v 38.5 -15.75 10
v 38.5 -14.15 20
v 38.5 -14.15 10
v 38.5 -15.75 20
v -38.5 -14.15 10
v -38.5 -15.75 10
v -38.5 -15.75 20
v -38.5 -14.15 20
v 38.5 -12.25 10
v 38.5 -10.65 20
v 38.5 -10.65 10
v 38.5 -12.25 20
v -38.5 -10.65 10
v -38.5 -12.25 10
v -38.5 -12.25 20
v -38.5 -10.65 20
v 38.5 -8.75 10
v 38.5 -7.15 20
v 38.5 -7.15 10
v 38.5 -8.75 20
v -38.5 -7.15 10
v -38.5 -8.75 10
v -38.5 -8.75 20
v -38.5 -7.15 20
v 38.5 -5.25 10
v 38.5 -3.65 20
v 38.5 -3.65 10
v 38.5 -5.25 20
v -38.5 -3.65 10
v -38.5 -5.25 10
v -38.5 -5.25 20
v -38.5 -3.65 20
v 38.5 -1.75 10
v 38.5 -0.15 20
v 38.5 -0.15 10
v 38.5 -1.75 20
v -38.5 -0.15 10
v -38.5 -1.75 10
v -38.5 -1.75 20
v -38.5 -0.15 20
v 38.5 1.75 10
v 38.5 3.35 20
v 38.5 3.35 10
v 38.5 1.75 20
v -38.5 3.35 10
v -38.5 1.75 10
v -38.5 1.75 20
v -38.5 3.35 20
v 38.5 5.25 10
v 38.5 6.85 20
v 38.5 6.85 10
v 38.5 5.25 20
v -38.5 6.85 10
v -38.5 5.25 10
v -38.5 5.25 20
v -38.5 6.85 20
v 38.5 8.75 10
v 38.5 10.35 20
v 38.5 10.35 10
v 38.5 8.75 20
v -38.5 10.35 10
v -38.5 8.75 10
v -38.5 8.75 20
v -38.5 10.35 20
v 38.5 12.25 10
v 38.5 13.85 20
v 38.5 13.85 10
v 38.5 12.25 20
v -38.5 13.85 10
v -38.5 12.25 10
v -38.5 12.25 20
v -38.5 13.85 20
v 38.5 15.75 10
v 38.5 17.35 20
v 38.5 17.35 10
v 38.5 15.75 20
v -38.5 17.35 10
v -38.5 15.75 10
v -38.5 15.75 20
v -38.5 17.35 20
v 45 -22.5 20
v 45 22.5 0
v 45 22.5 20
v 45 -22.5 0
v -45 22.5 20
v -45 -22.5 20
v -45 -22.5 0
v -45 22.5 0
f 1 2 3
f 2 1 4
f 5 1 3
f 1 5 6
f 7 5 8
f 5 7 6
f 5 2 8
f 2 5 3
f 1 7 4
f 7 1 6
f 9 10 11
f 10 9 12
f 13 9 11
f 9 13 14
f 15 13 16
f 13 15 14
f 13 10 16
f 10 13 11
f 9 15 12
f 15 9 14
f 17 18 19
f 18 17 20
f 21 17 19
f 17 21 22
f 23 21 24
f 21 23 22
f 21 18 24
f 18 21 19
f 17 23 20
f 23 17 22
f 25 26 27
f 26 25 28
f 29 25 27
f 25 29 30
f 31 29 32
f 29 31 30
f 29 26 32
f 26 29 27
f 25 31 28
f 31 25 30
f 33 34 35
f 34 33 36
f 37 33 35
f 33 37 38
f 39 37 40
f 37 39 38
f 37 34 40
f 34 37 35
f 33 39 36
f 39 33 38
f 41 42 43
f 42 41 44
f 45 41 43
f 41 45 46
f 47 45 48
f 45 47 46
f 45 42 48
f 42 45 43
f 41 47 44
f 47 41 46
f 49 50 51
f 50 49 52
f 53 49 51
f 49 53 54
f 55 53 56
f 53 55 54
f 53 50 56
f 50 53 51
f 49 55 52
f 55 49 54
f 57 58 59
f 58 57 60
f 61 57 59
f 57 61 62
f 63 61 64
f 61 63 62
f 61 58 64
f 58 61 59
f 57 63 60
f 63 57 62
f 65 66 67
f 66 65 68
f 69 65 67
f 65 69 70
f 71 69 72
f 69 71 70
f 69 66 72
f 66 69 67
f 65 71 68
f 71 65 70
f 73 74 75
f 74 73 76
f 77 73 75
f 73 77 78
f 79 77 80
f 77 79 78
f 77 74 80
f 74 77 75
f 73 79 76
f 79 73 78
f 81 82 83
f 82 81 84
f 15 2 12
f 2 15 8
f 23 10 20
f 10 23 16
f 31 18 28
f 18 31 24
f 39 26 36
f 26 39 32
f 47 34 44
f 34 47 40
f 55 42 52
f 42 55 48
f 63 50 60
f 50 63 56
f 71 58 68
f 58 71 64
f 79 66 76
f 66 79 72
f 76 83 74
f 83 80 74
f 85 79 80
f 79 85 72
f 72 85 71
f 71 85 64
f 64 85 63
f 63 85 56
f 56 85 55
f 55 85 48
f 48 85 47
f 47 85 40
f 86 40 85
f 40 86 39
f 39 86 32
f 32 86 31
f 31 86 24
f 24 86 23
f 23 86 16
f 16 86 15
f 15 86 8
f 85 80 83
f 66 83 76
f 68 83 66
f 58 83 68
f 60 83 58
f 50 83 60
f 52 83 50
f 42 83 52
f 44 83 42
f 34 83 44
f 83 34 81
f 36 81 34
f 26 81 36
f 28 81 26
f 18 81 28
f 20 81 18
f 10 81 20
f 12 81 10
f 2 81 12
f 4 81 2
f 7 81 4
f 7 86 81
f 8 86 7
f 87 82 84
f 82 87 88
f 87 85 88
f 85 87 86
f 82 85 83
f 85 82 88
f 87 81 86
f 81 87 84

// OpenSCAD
// Slide drying rack - holds 10 microscope slides standing upright on their long edge
// Print orientation: flat base on the XY plane, slots open upward (+Z)

// ---------------- Parameters ----------------
block_len    = 90;    // block length along X (mm)
block_wid    = 45;    // block width along Y (mm)
block_h      = 20;    // block height along Z (mm)

slot_count   = 10;    // number of slide slots
slot_len     = 77;    // slot length along X (mm)
slot_w       = 1.6;   // slot width along Y (mm)
slot_depth   = 10;    // slot depth from top face (mm)
slot_pitch   = 3.5;   // centre-to-centre slot spacing along Y (mm)

eps          = 0.5;   // overshoot so cutters pass through the top face (mm)

$fn = 64;

// ---------------- Model ----------------
difference() {
    // Main block, centred in X and Y, resting on z = 0
    translate([-block_len/2, -block_wid/2, 0])
        cube([block_len, block_wid, block_h]);

    // Slot group, centred on the block in X and Y
    for (i = [0 : slot_count - 1]) {
        y = (i - (slot_count - 1)/2) * slot_pitch;
        translate([-slot_len/2, y, block_h - slot_depth])
            cube([slot_len, slot_w, slot_depth + eps]);
    }
}
